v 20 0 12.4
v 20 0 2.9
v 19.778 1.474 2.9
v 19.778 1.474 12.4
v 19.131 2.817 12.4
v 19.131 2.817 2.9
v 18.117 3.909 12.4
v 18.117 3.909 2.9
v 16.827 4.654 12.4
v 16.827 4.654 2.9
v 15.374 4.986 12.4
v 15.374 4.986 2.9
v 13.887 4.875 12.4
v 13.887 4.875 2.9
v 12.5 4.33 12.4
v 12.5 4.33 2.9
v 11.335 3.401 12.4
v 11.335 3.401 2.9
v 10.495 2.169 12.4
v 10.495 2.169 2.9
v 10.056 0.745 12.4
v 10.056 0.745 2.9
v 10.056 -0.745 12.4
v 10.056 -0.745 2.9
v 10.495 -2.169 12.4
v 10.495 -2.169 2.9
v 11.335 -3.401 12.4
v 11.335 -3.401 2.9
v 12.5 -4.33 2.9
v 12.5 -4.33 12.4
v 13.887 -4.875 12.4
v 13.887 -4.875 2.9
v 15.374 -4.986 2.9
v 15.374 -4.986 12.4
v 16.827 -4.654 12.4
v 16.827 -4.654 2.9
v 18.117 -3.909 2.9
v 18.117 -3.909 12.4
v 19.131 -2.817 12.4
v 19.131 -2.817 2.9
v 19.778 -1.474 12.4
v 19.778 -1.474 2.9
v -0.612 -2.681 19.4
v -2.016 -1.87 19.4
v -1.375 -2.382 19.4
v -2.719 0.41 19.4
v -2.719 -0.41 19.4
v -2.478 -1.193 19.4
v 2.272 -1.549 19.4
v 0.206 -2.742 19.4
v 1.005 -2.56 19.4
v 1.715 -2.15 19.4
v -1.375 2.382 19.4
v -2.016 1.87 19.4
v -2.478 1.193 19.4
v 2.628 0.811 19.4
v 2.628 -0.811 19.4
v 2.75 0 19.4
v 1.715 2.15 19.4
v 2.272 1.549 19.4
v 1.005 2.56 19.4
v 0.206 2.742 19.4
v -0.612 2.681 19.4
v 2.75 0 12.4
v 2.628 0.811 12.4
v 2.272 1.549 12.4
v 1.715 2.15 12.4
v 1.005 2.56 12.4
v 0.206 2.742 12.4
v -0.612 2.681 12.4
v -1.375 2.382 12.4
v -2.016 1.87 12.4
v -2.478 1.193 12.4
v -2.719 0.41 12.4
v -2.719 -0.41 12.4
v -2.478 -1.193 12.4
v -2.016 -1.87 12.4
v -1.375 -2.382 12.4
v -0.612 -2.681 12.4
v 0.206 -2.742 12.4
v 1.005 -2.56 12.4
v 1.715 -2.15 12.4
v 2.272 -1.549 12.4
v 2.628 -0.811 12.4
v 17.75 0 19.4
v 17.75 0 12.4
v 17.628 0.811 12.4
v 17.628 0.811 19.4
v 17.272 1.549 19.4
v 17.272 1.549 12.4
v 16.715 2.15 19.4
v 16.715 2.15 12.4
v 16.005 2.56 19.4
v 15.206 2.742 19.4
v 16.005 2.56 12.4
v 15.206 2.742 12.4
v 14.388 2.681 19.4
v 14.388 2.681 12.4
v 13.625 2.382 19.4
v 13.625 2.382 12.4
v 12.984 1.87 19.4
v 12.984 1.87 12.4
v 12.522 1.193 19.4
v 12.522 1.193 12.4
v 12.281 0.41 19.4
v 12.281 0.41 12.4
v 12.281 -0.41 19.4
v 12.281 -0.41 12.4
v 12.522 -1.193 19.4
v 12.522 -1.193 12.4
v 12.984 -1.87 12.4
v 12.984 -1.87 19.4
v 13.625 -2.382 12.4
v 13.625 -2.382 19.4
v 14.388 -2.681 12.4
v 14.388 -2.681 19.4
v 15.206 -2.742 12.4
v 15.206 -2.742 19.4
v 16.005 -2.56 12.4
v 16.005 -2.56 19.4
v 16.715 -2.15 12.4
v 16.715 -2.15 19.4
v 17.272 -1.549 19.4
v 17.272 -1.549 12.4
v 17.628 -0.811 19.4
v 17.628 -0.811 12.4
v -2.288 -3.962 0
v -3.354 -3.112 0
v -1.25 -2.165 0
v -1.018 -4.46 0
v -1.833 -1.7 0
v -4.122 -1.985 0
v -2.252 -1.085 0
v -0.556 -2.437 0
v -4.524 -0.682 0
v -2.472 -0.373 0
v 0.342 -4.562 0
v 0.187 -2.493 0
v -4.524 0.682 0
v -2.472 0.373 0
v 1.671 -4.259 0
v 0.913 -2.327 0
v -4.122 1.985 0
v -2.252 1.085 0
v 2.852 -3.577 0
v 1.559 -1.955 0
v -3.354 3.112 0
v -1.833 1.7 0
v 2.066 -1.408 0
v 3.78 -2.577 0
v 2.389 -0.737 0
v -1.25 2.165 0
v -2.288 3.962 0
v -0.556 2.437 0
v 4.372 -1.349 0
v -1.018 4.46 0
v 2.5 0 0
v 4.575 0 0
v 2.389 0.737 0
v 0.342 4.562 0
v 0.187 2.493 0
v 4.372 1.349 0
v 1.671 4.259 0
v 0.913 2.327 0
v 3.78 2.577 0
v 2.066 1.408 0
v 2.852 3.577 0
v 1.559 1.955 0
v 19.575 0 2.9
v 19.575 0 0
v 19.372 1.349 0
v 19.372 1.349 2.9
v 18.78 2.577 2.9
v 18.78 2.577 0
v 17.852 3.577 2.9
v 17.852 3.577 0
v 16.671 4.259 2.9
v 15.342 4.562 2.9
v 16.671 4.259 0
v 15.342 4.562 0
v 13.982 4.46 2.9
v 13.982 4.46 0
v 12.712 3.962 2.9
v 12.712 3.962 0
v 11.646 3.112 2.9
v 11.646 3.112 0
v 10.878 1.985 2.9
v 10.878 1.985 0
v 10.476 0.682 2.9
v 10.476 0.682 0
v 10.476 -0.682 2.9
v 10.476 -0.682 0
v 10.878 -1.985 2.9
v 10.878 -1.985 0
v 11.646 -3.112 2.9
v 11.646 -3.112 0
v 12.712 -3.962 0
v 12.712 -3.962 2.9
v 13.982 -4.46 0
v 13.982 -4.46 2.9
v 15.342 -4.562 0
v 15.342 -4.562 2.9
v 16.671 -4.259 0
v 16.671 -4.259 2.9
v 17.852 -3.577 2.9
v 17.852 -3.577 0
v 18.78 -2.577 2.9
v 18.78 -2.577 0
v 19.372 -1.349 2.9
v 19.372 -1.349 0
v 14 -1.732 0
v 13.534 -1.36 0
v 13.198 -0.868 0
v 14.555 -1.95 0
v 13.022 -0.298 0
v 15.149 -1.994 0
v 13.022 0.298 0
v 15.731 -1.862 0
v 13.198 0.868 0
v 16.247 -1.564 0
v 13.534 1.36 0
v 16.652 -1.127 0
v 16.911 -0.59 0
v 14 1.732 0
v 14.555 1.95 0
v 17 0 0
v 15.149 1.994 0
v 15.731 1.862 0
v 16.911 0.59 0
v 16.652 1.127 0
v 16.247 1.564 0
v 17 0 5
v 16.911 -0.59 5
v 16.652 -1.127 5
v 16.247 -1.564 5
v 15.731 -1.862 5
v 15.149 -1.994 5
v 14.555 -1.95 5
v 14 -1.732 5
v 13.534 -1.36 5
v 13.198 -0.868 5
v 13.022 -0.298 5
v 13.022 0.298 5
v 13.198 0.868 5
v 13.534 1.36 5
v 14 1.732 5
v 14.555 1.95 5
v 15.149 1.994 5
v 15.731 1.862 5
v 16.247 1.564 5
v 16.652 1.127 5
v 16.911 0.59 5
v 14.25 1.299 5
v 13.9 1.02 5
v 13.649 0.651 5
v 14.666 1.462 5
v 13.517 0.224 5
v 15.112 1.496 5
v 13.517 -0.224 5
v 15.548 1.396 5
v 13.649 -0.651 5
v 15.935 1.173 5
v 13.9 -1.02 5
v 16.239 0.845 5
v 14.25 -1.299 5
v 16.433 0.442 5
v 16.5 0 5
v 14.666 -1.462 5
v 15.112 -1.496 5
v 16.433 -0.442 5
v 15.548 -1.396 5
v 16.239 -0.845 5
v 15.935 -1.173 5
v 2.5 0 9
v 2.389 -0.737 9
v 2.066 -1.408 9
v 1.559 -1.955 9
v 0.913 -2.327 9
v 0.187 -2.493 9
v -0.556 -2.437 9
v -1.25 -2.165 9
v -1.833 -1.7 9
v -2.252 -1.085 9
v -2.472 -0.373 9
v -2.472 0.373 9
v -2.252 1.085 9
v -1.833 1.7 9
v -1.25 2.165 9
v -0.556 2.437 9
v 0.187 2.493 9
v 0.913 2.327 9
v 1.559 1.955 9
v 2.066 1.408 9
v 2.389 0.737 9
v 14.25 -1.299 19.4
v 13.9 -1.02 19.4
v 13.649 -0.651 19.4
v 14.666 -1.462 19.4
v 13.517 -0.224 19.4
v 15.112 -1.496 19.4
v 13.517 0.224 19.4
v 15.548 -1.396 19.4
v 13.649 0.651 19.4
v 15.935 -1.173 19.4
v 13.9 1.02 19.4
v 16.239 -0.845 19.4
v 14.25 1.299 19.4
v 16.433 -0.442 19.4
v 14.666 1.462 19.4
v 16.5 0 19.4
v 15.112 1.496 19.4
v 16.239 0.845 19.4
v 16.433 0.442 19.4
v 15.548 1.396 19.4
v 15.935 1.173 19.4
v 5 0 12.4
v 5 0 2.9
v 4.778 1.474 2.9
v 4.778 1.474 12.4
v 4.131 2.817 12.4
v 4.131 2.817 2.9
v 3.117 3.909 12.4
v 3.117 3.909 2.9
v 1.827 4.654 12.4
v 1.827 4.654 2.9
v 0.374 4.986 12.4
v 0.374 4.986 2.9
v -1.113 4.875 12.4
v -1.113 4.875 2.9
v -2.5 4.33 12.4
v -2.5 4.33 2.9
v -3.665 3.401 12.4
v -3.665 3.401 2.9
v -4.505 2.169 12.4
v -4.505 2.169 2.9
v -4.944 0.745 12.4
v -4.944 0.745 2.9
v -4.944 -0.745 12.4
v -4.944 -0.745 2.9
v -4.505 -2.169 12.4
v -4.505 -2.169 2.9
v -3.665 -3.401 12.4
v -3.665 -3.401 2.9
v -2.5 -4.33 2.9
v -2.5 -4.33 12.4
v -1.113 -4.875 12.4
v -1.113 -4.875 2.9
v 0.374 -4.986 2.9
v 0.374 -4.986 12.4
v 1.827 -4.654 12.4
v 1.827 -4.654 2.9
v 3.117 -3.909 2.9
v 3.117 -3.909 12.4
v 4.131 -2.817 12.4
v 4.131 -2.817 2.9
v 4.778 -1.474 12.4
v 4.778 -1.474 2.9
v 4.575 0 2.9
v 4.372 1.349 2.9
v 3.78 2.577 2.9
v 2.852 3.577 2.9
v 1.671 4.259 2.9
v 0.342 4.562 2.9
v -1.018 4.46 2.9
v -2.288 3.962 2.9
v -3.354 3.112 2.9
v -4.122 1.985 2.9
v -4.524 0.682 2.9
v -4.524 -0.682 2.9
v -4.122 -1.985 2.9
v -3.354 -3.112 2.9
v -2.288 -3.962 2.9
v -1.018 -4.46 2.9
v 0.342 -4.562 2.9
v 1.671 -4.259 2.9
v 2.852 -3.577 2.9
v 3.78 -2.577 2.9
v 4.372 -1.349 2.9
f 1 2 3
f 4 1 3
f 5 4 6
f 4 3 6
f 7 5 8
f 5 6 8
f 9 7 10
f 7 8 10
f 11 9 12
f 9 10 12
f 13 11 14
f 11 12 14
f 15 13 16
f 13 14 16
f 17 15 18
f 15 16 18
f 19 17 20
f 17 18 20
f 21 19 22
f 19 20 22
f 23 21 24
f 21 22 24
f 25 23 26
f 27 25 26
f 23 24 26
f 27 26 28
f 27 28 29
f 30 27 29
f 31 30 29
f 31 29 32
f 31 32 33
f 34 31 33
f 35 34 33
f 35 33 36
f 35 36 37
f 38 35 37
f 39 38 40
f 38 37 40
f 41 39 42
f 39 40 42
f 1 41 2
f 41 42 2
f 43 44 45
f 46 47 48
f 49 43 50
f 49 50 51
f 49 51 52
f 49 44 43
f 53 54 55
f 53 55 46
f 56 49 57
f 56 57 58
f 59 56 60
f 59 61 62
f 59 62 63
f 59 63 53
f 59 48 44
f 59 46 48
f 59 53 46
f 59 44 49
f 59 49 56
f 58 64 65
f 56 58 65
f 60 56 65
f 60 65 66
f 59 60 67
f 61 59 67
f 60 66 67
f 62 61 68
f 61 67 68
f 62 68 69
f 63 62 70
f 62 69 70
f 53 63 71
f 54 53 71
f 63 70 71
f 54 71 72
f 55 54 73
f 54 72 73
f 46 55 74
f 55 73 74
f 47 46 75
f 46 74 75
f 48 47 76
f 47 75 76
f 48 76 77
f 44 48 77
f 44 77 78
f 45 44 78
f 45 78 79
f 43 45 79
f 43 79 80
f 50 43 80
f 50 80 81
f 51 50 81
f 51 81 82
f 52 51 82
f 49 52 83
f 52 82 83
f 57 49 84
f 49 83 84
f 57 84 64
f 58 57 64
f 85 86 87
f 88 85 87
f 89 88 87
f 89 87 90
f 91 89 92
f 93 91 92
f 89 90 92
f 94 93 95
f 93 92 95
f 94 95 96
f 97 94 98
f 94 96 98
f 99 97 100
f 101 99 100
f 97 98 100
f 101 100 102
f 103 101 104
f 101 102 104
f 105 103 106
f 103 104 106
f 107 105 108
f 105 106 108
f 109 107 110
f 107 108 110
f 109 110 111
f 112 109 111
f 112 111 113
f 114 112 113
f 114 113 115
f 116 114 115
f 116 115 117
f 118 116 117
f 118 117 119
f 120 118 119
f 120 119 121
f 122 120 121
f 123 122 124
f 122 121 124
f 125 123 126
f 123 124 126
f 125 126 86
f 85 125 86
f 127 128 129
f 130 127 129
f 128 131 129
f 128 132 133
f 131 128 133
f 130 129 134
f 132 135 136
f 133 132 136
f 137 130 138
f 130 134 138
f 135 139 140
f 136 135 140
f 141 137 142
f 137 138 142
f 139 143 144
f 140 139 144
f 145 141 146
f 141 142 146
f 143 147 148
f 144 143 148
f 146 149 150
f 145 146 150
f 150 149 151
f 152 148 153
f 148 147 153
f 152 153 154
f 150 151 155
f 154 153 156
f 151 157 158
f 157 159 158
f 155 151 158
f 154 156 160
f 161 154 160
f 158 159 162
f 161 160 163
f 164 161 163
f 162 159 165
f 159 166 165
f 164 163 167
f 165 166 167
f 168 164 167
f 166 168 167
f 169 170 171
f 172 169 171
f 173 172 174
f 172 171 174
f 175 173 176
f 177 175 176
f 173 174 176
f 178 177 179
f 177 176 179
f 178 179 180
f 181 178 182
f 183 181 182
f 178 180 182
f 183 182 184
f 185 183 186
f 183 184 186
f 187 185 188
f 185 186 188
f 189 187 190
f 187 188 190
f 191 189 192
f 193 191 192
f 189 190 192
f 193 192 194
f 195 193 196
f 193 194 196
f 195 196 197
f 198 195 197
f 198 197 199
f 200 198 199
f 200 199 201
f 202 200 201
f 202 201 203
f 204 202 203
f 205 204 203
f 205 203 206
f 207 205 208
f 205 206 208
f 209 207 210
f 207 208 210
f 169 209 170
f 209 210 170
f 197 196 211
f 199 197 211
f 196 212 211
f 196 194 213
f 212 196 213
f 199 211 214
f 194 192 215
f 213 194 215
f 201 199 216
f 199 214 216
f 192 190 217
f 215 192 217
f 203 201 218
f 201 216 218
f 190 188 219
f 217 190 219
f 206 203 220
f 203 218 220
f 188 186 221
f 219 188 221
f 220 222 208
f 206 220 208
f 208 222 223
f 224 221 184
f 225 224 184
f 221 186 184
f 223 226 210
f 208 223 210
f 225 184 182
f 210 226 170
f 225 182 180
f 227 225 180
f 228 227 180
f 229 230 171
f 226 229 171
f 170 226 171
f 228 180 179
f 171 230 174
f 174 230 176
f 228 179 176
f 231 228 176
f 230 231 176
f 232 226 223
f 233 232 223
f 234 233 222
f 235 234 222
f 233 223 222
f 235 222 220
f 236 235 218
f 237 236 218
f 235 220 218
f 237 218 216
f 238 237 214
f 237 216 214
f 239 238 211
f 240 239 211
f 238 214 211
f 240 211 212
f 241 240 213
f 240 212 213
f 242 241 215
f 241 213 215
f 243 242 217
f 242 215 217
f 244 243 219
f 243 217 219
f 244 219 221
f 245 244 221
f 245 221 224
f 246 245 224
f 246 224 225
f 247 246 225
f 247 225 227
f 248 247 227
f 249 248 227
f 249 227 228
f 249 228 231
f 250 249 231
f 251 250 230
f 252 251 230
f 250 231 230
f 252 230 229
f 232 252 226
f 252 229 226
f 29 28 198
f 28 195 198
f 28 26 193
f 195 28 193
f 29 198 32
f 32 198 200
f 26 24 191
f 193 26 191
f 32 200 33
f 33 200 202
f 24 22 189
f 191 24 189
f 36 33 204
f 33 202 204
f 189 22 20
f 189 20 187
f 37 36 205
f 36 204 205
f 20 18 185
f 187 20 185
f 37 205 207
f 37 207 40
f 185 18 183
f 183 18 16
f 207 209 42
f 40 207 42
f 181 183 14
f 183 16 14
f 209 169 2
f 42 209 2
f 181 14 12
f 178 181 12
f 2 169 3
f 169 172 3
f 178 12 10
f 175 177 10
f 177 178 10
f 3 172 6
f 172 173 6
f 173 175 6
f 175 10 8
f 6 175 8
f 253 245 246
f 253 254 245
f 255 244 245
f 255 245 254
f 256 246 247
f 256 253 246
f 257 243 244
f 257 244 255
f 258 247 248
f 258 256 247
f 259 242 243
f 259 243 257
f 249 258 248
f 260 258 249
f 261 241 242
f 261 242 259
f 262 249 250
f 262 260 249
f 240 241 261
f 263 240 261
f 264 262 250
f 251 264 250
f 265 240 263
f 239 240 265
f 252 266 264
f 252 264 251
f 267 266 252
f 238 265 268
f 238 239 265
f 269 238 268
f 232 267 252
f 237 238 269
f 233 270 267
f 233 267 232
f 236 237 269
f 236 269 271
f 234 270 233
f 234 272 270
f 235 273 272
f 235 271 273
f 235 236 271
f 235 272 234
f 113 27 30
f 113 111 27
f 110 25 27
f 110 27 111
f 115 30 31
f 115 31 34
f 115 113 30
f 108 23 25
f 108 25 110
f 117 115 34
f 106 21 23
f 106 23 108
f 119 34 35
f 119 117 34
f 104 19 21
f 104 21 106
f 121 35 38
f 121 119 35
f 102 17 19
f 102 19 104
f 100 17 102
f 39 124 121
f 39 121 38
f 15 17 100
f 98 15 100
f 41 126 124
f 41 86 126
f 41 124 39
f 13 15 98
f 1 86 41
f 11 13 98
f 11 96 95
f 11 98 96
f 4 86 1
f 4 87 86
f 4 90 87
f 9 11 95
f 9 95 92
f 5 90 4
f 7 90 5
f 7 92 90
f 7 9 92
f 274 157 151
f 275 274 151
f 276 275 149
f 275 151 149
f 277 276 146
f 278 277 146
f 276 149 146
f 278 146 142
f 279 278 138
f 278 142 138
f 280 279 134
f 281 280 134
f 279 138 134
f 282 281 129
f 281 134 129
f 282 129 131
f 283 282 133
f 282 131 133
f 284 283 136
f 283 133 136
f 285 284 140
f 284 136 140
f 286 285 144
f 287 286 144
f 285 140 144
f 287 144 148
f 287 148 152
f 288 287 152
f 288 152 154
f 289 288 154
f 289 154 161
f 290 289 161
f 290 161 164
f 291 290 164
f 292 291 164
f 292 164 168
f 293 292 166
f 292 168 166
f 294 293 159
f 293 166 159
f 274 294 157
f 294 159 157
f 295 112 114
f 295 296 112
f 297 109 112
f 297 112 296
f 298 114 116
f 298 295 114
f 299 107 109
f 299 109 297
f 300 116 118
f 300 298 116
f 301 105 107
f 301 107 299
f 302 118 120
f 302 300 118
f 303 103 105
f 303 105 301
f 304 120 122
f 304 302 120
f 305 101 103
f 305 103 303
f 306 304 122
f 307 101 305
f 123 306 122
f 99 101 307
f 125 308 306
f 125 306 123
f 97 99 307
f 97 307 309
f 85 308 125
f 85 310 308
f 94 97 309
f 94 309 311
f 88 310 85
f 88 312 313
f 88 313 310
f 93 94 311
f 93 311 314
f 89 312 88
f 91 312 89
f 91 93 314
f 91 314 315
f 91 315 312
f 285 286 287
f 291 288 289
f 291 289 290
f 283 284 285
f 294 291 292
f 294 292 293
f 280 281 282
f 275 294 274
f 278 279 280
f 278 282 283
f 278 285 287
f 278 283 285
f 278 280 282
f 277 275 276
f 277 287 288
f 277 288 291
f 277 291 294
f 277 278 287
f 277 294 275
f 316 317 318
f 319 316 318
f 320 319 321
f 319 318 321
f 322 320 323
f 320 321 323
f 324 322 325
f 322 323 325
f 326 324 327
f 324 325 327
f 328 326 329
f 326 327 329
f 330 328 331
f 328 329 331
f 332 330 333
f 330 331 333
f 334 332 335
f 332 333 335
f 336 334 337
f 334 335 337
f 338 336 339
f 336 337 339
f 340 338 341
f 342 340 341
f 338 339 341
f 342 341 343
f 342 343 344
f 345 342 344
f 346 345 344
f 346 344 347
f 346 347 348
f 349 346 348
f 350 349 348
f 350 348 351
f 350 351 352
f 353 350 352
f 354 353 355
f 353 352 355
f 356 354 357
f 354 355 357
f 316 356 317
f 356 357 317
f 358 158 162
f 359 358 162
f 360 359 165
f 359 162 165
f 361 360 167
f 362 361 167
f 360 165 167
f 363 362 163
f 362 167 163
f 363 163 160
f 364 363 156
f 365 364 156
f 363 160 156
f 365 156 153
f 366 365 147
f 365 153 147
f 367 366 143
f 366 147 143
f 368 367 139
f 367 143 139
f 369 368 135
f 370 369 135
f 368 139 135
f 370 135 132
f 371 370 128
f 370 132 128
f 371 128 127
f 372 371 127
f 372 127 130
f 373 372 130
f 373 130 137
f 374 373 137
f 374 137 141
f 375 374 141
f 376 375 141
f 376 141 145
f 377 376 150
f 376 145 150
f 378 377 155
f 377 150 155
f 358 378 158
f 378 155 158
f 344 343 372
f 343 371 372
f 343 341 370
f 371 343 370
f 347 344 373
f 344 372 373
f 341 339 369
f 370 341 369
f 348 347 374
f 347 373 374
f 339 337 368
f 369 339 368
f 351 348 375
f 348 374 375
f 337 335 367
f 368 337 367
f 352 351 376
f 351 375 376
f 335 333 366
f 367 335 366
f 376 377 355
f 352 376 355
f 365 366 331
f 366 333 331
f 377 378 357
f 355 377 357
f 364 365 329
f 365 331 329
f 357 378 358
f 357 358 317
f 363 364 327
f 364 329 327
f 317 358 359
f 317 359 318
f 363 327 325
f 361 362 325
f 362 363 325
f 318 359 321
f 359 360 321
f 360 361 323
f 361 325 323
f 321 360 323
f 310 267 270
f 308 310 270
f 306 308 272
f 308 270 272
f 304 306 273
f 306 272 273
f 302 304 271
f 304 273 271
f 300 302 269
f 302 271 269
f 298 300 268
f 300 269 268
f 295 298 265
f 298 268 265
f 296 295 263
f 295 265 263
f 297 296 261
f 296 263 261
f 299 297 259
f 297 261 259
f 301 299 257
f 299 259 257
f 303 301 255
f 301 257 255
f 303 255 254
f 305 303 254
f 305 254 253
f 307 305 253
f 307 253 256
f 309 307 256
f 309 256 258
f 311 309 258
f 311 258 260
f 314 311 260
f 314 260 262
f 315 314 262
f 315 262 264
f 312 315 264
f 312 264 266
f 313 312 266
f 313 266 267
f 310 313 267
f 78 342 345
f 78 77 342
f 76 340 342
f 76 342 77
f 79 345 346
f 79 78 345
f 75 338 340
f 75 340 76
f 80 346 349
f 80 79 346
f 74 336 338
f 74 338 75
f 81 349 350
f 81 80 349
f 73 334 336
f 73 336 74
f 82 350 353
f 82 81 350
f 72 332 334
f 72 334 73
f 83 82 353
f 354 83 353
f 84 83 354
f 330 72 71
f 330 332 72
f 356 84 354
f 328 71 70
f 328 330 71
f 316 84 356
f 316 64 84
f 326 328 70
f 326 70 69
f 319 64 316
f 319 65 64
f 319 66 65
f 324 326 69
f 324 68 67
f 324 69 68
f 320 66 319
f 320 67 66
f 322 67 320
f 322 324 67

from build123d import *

# Parameters (mm, degrees)
SKETCH_R        = 4.575
PAD_DEPTH       = 2.9
SKETCH001_R     = 5
PAD001_DEPTH    = 9.5
SKETCH002_R     = 2.75
PAD002_DEPTH    = 7
SKETCH003_R     = 2.5
POCKET_DEPTH    = 9
SKETCH004_R     = 4.575
PAD003_DEPTH    = 2.9
SKETCH005_R     = 5
PAD004_DEPTH    = 9.5
SKETCH006_R     = 2.75
PAD005_DEPTH    = 7
SKETCH007_R     = 2
POCKET001_DEPTH = 5
SKETCH008_R     = 1.5
POCKET002_DEPTH = 14.401


with BuildPart() as glass_side:
    # Sketch → Pad (new body)
    with BuildSketch(Plane.XY):
        Circle(SKETCH_R)
    extrude(amount=PAD_DEPTH)

    # Sketch001 (on Face3 of Pad) → Pad001 (join)
    with BuildSketch(Plane.XY.offset(2.9)):
        Circle(SKETCH001_R)
    extrude(amount=PAD001_DEPTH)

    # Sketch002 (on Face3 of Pad001) → Pad002 (join)
    with BuildSketch(Plane.XY.offset(12.4)):
        Circle(SKETCH002_R)
    extrude(amount=PAD002_DEPTH)

    # Sketch003 (on Face6 of Pad002) → Pocket (cut)
    with BuildSketch(Plane(origin=(0, 0, 0), x_dir=(1, 0, 0), z_dir=(0, 0, -1))):
        Circle(SKETCH003_R)
    extrude(amount=-POCKET_DEPTH, mode=Mode.SUBTRACT)


with BuildPart() as metal_side:
    # Sketch004 → Pad003 (new body)
    with BuildSketch(Plane.XY):
        with Locations((15, 0)):
            Circle(SKETCH004_R)
    extrude(amount=PAD003_DEPTH)

    # Sketch005 (on Face3 of Pad003) → Pad004 (join)
    with BuildSketch(Plane.XY.offset(2.9)):
        with Locations((15, 0)):
            Circle(SKETCH005_R)
    extrude(amount=PAD004_DEPTH)

    # Sketch006 (on Face3 of Pad004) → Pad005 (join)
    with BuildSketch(Plane.XY.offset(12.4)):
        with Locations((15, 0)):
            Circle(SKETCH006_R)
    extrude(amount=PAD005_DEPTH)

    # Sketch007 (on Face6 of Pad005) → Pocket001 (cut)
    with BuildSketch(Plane(origin=(0, 0, 0), x_dir=(1, 0, 0), z_dir=(0, 0, -1))):
        with Locations((15, 0)):
            Circle(SKETCH007_R)
    extrude(amount=-POCKET001_DEPTH, mode=Mode.SUBTRACT)

    # Sketch008 (on Face9 of Pocket001) → Pocket002 (cut, through all)
    with BuildSketch(Plane(origin=(0, 0, 5), x_dir=(1, 0, 0), z_dir=(0, 0, -1))):
        with Locations((15, 0)):
            Circle(SKETCH008_R)
    extrude(amount=-POCKET002_DEPTH, mode=Mode.SUBTRACT)


solid = Compound([glass_side.part, metal_side.part])
